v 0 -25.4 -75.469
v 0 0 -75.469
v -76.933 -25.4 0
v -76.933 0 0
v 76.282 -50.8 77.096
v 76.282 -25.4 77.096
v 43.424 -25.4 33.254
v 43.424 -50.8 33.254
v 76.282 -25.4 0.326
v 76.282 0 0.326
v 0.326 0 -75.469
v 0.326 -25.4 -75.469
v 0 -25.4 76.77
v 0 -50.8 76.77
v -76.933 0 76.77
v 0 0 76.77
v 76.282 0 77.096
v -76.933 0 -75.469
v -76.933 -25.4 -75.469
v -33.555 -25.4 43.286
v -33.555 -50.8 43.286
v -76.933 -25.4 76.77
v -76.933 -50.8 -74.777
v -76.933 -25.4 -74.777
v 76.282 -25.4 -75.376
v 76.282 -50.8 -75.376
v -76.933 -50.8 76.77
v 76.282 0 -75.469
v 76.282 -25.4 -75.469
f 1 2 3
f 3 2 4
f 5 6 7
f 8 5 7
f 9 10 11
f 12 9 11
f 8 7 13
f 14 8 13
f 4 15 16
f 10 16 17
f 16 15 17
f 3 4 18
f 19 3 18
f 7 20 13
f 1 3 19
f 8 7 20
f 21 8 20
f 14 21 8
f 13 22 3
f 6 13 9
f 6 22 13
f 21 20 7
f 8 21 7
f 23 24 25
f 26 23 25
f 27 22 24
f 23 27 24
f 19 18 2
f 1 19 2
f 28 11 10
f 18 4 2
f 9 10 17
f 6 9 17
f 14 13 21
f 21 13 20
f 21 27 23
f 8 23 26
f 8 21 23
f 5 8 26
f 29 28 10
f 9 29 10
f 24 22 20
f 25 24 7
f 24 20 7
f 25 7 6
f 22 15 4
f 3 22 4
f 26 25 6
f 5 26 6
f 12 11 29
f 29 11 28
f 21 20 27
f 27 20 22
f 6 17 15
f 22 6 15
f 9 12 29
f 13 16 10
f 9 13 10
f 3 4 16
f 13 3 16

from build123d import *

# Parameters (mm, degrees)
F1_DEPTH = 25.4
F3_DEPTH = 25.4
F4_DEPTH = 25.4


with BuildPart() as f1:
    # F0 (on Front) → F1 (new body)
    with BuildSketch(Plane.XZ):
        Polygon((76.282389462, 77.0956277847), (-76.9329741597, 76.7703279853), (-76.9329741597, 0), (0, 76.7703279853), (76.282389462, 0.326326099), align=None)
    extrude(amount=F1_DEPTH)


with BuildPart() as f1b:
    # F0 (on Front) → F1, piece 2 (new body)
    with BuildSketch(Plane.XZ):
        Polygon((76.282389462, -75.4691362381), (76.282389462, 0.326326099), (0.326346308, -75.4691362381), align=None)
    extrude(amount=F1_DEPTH)


with BuildPart() as f1c:
    # F0 (on Front) → F1, piece 3 (new body)
    with BuildSketch(Plane.XZ):
        Polygon((0, -75.4691362381), (-76.9329741597, 0), (-76.9329741597, -75.4691362381), align=None)
    extrude(amount=F1_DEPTH)


with BuildPart() as f3:
    # F2 (on face) → F3 (new body)
    with BuildSketch(Plane.XZ.offset(25.4)):
        Polygon((0, 76.7703279853), (-33.5551746446, 43.2860932835), (43.4244395533, 33.253889099), align=None)
    extrude(amount=F3_DEPTH)


with BuildPart() as f4:
    # F2 (on face) → F4 (new body)
    with BuildSketch(Plane.XZ.offset(25.4)):
        Polygon((-33.5551746446, 43.2860932835), (-76.9329741597, 76.7703279853), (-76.9329741597, -74.7774764895), (-30.2719958127, -46.0318885744), align=None)
        Polygon((43.4244395533, 33.253889099), (-33.5551746446, 43.2860932835), (-30.2719958127, -46.0318885744), (30.0138946623, -46.0318885744), align=None)
        Polygon((-30.2719958127, -46.0318885744), (-76.9329741597, -74.7774764895), (76.282389462, -75.3763392568), (30.0138946623, -46.0318885744), align=None)
        Polygon((76.282389462, 77.0956277847), (43.4244395533, 33.253889099), (30.0138946623, -46.0318885744), (76.282389462, -75.3763392568), align=None)
    extrude(amount=F4_DEPTH)


solid = Compound([f1.part, f1b.part, f1c.part, f3.part, f4.part])
